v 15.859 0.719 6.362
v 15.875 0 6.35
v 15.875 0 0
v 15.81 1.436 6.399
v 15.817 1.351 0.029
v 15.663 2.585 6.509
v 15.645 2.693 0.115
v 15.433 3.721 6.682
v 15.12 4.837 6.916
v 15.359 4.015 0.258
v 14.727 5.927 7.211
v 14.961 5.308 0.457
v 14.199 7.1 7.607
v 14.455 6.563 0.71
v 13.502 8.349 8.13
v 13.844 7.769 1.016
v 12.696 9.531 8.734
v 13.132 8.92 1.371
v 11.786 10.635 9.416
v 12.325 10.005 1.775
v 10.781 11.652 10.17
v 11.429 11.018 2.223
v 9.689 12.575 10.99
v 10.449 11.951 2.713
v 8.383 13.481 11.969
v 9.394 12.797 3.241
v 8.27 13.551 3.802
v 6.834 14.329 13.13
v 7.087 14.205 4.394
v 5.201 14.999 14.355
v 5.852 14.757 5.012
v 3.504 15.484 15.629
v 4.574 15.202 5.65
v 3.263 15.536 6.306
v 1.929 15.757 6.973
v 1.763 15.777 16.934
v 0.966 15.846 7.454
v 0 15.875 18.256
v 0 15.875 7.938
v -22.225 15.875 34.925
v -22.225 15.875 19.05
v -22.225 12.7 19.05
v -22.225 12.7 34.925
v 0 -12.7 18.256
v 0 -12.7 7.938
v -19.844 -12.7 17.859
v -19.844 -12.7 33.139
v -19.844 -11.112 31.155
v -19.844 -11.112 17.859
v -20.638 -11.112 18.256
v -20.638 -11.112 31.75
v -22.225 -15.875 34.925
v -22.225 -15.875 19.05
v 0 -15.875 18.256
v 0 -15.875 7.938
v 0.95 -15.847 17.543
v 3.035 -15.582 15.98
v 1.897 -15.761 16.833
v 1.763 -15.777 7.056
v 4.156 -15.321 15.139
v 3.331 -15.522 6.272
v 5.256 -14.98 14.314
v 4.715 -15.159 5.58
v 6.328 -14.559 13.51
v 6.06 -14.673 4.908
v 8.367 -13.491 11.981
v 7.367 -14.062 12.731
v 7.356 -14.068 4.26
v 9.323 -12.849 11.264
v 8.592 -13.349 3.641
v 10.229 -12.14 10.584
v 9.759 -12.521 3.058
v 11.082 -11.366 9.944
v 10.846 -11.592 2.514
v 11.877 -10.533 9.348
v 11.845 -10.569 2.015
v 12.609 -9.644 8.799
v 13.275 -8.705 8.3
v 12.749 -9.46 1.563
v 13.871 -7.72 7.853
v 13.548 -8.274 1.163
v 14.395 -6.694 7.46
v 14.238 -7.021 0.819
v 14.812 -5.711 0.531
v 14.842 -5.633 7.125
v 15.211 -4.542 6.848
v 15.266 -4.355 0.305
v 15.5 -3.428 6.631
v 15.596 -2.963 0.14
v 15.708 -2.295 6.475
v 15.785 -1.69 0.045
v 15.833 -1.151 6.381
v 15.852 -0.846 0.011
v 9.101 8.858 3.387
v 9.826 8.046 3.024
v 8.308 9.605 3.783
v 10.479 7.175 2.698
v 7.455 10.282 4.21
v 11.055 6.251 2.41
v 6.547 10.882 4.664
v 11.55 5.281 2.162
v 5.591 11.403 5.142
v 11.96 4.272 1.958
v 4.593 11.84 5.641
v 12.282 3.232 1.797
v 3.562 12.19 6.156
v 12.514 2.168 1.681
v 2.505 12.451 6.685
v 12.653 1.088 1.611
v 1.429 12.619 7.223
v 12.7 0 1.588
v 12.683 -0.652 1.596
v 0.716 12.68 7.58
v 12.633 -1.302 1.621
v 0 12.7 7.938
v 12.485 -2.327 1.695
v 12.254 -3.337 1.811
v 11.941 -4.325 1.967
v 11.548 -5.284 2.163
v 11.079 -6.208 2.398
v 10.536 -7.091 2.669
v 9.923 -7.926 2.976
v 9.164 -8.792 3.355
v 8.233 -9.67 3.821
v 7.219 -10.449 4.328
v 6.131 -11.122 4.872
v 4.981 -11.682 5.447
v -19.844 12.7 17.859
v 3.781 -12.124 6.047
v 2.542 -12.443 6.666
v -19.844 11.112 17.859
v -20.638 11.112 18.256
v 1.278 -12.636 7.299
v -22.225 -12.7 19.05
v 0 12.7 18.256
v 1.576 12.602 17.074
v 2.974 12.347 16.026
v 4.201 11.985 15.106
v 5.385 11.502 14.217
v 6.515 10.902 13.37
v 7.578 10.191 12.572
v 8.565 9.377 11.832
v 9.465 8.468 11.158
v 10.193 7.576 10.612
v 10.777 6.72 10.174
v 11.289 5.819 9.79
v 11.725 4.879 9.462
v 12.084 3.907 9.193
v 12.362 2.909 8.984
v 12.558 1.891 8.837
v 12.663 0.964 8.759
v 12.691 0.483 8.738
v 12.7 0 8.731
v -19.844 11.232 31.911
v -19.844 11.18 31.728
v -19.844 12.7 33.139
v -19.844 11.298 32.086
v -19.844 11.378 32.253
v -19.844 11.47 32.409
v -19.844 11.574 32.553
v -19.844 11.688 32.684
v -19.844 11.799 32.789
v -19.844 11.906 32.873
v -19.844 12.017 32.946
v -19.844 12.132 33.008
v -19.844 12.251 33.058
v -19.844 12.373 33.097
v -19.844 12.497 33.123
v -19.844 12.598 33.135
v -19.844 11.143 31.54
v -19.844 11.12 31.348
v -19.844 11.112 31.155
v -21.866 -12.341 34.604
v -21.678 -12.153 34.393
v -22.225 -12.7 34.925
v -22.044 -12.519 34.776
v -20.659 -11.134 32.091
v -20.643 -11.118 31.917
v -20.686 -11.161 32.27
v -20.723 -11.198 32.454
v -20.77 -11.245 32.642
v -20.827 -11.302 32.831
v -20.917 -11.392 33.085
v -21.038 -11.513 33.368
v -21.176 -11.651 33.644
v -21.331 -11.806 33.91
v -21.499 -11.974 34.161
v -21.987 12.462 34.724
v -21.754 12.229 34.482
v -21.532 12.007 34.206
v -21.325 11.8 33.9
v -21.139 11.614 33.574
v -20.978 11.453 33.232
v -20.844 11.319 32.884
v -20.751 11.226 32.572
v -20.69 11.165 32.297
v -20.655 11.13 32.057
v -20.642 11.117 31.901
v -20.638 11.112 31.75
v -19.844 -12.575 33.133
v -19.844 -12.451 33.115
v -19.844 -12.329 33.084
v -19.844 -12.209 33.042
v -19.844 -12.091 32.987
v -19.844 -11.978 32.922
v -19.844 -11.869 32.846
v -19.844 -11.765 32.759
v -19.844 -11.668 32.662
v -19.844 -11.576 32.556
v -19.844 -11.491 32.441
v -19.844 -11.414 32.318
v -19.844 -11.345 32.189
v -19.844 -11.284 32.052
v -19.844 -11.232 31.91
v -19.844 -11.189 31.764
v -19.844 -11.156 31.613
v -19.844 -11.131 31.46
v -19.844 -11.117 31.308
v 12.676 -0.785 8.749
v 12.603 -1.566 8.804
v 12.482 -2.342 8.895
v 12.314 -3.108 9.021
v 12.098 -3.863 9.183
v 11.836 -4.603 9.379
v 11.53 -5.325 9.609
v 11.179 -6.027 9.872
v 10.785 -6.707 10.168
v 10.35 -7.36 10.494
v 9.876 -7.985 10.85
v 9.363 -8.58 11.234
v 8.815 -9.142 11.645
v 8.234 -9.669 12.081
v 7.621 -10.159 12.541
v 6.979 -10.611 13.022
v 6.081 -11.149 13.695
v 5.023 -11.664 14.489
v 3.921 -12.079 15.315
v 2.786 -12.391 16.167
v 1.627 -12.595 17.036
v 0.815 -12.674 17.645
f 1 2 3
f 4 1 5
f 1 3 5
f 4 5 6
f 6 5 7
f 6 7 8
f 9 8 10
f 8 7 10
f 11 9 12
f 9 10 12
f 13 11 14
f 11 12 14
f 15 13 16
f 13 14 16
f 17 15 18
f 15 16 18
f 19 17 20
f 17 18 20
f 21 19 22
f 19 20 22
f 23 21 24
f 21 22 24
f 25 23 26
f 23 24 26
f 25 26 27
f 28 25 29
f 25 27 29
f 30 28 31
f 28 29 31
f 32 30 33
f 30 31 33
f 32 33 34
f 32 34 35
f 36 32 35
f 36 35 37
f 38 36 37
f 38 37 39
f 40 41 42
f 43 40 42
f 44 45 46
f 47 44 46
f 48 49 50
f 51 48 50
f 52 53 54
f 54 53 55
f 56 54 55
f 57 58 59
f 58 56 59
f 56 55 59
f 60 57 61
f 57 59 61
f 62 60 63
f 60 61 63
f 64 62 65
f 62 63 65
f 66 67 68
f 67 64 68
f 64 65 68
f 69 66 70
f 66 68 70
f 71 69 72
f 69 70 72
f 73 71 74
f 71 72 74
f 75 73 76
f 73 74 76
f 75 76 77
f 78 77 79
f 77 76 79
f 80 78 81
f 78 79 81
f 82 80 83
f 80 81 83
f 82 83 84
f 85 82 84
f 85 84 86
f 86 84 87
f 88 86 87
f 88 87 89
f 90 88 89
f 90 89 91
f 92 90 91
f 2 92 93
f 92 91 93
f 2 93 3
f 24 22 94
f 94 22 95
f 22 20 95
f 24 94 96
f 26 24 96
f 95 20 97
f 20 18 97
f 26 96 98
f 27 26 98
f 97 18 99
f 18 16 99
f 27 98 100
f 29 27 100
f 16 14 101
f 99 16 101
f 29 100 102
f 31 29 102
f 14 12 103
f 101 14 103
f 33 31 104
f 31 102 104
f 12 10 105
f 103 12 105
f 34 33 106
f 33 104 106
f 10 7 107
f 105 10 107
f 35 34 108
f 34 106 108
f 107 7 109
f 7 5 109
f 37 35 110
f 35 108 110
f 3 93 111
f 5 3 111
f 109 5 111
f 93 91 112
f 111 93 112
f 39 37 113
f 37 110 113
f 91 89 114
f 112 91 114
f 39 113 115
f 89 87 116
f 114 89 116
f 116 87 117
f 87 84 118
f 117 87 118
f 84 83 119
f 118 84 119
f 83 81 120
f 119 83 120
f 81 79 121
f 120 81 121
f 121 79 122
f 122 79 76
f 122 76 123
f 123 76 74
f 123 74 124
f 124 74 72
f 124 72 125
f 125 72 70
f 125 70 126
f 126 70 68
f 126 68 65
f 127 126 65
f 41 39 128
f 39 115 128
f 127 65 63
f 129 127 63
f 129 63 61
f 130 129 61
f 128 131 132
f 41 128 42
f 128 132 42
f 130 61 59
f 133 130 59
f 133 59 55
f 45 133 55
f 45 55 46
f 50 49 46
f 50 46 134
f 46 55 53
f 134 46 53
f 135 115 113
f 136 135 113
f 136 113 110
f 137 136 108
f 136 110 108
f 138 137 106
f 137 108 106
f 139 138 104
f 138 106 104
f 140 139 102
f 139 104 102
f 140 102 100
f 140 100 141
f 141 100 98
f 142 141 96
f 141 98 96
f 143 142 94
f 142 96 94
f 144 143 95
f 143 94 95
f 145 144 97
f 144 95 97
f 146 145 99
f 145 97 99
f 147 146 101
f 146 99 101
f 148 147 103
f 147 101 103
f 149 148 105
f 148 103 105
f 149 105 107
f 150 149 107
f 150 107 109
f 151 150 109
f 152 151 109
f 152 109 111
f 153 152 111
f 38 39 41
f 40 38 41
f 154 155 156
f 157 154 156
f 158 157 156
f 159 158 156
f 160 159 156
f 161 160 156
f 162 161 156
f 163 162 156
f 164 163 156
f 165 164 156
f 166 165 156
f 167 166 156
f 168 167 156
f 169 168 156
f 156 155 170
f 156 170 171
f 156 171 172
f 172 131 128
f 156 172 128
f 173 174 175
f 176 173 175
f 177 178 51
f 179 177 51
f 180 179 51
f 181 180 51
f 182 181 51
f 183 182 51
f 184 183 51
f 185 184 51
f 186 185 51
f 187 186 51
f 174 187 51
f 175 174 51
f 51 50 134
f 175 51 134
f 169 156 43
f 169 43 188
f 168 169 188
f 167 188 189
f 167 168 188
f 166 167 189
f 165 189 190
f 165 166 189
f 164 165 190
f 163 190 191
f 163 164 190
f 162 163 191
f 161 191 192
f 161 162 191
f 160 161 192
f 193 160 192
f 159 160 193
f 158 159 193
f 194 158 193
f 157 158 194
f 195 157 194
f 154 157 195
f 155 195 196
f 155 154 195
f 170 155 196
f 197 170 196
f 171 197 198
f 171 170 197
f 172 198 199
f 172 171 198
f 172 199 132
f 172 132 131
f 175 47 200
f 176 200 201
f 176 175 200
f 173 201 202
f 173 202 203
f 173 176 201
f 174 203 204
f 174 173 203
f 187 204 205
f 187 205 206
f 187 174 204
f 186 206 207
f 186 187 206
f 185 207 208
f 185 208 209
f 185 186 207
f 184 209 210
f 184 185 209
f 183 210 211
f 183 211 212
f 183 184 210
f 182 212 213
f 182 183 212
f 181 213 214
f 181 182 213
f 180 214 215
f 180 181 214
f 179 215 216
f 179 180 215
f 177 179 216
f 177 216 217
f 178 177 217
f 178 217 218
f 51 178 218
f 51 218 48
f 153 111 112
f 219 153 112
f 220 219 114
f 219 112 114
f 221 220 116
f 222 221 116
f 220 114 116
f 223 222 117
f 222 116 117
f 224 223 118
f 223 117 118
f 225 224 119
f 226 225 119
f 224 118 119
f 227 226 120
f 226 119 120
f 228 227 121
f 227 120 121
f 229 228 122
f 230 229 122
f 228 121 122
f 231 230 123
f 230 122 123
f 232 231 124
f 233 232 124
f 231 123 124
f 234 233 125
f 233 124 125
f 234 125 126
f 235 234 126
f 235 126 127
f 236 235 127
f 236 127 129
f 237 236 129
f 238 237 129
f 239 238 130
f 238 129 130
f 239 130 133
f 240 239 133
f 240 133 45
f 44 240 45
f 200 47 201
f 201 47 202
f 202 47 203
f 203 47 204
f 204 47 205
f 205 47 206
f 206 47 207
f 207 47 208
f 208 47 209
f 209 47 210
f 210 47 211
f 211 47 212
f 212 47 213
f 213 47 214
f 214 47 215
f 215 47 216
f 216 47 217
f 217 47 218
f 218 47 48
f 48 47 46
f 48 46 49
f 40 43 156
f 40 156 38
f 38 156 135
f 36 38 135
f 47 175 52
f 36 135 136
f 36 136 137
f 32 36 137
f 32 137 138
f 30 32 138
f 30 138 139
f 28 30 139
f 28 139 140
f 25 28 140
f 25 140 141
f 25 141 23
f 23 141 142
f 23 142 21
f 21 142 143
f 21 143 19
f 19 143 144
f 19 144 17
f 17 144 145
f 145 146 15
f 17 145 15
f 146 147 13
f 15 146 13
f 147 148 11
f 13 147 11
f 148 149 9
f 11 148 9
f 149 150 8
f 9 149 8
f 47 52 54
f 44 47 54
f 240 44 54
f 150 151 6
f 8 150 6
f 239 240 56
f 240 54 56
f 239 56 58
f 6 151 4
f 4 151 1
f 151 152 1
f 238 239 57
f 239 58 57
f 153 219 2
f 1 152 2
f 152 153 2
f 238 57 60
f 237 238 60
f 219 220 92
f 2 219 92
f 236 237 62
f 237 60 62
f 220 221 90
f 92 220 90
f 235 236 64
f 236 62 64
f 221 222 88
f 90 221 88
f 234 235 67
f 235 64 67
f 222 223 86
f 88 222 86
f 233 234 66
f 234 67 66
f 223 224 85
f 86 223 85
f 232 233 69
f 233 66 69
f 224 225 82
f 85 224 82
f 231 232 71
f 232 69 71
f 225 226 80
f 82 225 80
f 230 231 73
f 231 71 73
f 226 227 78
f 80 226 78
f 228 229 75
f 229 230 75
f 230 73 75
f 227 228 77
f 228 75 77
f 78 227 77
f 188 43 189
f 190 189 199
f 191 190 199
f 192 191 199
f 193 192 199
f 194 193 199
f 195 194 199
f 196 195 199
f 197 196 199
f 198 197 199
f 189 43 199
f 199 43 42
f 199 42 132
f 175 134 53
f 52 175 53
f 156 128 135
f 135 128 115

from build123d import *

# Parameters (mm, degrees)
F1_DEPTH    = 34.925
F3_DEPTH    = 31.75
F4_T1_DEPTH = 8.9296875
F4_T3_DEPTH = 8.9296875


# Not quite as in the source:
# - a fillet or chamfer that OpenCascade refuses, or shapes differently, is made with other operations: its cross-section is extruded or revolved along the edge and cut away or added


with BuildPart() as f1:
    # F0 (on Top) → F1 (new body)
    with BuildSketch(Plane.XY):
        with BuildLine():
            Line((0, 15.875), (-22.225, 15.875))
            Line((-22.225, 15.875), (-22.225, 12.7))
            Line((-22.225, 12.7), (-20.6375, 11.1125))
            Line((-20.6375, 11.1125), (-19.84375, 11.1125))
            Line((-19.84375, 11.1125), (-19.84375, 12.7))
            Line((-19.84375, 12.7), (0, 12.7))
            ThreePointArc((0, 12.7), (8.9802561211, 8.9802561211), (12.7, 0))
            ThreePointArc((12.7, 0), (8.9802561211, -8.9802561211), (0, -12.7))
            Line((0, -12.7), (-19.84375, -12.7))
            Line((-19.84375, -12.7), (-19.84375, -11.1125))
            Line((-19.84375, -11.1125), (-20.6375, -11.1125))
            Line((-20.6375, -11.1125), (-22.225, -12.7))
            Line((-22.225, -12.7), (-22.225, -15.875))
            Line((-22.225, -15.875), (0, -15.875))
            ThreePointArc((0, -15.875), (11.2253201513, -11.2253201513), (15.875, 0))
            ThreePointArc((15.875, 0), (11.2253201513, 11.2253201513), (0, 15.875))
        make_face()
    extrude(amount=F1_DEPTH)

    # F2 (on face) → F3 (cut, through all)
    with BuildSketch(Plane.XZ.offset(15.875)):
        Polygon((0, 18.25625), (0, 34.925), (-22.225, 34.925), align=None)
        Polygon((15.875, 6.35), (15.875, 34.925), (0, 34.925), (0, 18.25625), align=None)
        Polygon((-22.225, 0), (0, 0), (0, 7.9375), (-22.225, 19.05), align=None)
        Polygon((0, 0), (15.875, 0), (0, 7.9375), align=None)
    extrude(amount=-F3_DEPTH, mode=Mode.SUBTRACT)

    # F4: fillet of radius 1.5875 on 2 edges, made by hand

    # F4_s2 → F4_t1 (cut)
    with BuildSketch(Plane(origin=(-25.43175, 0, 19.0738125), x_dir=(0, 1, 0), z_dir=(-0.8, 0, 0.6))):
        with BuildLine():
            ThreePointArc((12.7, -14.605), (11.5774679849, -14.1400320151), (11.1125, -13.0175))
            Line((11.1125, -13.0175), (11.1125, -14.605))
            Line((11.1125, -14.605), (12.7, -14.605))
        make_face()
    extrude(amount=F4_T1_DEPTH, mode=Mode.SUBTRACT)

    # F4_s4 → F4_t3 (cut)
    with BuildSketch(Plane(origin=(-32.5755, 0, 24.431625), x_dir=(0, 1, 0), z_dir=(0.8, 0, -0.6))):
        with BuildLine():
            ThreePointArc((-12.7, 14.605), (-11.5774679849, 14.1400320151), (-11.1125, 13.0175))
            Line((-11.1125, 13.0175), (-11.1125, 14.605))
            Line((-11.1125, 14.605), (-12.7, 14.605))
        make_face()
    extrude(amount=F4_T3_DEPTH, mode=Mode.SUBTRACT)


solid = f1.part
